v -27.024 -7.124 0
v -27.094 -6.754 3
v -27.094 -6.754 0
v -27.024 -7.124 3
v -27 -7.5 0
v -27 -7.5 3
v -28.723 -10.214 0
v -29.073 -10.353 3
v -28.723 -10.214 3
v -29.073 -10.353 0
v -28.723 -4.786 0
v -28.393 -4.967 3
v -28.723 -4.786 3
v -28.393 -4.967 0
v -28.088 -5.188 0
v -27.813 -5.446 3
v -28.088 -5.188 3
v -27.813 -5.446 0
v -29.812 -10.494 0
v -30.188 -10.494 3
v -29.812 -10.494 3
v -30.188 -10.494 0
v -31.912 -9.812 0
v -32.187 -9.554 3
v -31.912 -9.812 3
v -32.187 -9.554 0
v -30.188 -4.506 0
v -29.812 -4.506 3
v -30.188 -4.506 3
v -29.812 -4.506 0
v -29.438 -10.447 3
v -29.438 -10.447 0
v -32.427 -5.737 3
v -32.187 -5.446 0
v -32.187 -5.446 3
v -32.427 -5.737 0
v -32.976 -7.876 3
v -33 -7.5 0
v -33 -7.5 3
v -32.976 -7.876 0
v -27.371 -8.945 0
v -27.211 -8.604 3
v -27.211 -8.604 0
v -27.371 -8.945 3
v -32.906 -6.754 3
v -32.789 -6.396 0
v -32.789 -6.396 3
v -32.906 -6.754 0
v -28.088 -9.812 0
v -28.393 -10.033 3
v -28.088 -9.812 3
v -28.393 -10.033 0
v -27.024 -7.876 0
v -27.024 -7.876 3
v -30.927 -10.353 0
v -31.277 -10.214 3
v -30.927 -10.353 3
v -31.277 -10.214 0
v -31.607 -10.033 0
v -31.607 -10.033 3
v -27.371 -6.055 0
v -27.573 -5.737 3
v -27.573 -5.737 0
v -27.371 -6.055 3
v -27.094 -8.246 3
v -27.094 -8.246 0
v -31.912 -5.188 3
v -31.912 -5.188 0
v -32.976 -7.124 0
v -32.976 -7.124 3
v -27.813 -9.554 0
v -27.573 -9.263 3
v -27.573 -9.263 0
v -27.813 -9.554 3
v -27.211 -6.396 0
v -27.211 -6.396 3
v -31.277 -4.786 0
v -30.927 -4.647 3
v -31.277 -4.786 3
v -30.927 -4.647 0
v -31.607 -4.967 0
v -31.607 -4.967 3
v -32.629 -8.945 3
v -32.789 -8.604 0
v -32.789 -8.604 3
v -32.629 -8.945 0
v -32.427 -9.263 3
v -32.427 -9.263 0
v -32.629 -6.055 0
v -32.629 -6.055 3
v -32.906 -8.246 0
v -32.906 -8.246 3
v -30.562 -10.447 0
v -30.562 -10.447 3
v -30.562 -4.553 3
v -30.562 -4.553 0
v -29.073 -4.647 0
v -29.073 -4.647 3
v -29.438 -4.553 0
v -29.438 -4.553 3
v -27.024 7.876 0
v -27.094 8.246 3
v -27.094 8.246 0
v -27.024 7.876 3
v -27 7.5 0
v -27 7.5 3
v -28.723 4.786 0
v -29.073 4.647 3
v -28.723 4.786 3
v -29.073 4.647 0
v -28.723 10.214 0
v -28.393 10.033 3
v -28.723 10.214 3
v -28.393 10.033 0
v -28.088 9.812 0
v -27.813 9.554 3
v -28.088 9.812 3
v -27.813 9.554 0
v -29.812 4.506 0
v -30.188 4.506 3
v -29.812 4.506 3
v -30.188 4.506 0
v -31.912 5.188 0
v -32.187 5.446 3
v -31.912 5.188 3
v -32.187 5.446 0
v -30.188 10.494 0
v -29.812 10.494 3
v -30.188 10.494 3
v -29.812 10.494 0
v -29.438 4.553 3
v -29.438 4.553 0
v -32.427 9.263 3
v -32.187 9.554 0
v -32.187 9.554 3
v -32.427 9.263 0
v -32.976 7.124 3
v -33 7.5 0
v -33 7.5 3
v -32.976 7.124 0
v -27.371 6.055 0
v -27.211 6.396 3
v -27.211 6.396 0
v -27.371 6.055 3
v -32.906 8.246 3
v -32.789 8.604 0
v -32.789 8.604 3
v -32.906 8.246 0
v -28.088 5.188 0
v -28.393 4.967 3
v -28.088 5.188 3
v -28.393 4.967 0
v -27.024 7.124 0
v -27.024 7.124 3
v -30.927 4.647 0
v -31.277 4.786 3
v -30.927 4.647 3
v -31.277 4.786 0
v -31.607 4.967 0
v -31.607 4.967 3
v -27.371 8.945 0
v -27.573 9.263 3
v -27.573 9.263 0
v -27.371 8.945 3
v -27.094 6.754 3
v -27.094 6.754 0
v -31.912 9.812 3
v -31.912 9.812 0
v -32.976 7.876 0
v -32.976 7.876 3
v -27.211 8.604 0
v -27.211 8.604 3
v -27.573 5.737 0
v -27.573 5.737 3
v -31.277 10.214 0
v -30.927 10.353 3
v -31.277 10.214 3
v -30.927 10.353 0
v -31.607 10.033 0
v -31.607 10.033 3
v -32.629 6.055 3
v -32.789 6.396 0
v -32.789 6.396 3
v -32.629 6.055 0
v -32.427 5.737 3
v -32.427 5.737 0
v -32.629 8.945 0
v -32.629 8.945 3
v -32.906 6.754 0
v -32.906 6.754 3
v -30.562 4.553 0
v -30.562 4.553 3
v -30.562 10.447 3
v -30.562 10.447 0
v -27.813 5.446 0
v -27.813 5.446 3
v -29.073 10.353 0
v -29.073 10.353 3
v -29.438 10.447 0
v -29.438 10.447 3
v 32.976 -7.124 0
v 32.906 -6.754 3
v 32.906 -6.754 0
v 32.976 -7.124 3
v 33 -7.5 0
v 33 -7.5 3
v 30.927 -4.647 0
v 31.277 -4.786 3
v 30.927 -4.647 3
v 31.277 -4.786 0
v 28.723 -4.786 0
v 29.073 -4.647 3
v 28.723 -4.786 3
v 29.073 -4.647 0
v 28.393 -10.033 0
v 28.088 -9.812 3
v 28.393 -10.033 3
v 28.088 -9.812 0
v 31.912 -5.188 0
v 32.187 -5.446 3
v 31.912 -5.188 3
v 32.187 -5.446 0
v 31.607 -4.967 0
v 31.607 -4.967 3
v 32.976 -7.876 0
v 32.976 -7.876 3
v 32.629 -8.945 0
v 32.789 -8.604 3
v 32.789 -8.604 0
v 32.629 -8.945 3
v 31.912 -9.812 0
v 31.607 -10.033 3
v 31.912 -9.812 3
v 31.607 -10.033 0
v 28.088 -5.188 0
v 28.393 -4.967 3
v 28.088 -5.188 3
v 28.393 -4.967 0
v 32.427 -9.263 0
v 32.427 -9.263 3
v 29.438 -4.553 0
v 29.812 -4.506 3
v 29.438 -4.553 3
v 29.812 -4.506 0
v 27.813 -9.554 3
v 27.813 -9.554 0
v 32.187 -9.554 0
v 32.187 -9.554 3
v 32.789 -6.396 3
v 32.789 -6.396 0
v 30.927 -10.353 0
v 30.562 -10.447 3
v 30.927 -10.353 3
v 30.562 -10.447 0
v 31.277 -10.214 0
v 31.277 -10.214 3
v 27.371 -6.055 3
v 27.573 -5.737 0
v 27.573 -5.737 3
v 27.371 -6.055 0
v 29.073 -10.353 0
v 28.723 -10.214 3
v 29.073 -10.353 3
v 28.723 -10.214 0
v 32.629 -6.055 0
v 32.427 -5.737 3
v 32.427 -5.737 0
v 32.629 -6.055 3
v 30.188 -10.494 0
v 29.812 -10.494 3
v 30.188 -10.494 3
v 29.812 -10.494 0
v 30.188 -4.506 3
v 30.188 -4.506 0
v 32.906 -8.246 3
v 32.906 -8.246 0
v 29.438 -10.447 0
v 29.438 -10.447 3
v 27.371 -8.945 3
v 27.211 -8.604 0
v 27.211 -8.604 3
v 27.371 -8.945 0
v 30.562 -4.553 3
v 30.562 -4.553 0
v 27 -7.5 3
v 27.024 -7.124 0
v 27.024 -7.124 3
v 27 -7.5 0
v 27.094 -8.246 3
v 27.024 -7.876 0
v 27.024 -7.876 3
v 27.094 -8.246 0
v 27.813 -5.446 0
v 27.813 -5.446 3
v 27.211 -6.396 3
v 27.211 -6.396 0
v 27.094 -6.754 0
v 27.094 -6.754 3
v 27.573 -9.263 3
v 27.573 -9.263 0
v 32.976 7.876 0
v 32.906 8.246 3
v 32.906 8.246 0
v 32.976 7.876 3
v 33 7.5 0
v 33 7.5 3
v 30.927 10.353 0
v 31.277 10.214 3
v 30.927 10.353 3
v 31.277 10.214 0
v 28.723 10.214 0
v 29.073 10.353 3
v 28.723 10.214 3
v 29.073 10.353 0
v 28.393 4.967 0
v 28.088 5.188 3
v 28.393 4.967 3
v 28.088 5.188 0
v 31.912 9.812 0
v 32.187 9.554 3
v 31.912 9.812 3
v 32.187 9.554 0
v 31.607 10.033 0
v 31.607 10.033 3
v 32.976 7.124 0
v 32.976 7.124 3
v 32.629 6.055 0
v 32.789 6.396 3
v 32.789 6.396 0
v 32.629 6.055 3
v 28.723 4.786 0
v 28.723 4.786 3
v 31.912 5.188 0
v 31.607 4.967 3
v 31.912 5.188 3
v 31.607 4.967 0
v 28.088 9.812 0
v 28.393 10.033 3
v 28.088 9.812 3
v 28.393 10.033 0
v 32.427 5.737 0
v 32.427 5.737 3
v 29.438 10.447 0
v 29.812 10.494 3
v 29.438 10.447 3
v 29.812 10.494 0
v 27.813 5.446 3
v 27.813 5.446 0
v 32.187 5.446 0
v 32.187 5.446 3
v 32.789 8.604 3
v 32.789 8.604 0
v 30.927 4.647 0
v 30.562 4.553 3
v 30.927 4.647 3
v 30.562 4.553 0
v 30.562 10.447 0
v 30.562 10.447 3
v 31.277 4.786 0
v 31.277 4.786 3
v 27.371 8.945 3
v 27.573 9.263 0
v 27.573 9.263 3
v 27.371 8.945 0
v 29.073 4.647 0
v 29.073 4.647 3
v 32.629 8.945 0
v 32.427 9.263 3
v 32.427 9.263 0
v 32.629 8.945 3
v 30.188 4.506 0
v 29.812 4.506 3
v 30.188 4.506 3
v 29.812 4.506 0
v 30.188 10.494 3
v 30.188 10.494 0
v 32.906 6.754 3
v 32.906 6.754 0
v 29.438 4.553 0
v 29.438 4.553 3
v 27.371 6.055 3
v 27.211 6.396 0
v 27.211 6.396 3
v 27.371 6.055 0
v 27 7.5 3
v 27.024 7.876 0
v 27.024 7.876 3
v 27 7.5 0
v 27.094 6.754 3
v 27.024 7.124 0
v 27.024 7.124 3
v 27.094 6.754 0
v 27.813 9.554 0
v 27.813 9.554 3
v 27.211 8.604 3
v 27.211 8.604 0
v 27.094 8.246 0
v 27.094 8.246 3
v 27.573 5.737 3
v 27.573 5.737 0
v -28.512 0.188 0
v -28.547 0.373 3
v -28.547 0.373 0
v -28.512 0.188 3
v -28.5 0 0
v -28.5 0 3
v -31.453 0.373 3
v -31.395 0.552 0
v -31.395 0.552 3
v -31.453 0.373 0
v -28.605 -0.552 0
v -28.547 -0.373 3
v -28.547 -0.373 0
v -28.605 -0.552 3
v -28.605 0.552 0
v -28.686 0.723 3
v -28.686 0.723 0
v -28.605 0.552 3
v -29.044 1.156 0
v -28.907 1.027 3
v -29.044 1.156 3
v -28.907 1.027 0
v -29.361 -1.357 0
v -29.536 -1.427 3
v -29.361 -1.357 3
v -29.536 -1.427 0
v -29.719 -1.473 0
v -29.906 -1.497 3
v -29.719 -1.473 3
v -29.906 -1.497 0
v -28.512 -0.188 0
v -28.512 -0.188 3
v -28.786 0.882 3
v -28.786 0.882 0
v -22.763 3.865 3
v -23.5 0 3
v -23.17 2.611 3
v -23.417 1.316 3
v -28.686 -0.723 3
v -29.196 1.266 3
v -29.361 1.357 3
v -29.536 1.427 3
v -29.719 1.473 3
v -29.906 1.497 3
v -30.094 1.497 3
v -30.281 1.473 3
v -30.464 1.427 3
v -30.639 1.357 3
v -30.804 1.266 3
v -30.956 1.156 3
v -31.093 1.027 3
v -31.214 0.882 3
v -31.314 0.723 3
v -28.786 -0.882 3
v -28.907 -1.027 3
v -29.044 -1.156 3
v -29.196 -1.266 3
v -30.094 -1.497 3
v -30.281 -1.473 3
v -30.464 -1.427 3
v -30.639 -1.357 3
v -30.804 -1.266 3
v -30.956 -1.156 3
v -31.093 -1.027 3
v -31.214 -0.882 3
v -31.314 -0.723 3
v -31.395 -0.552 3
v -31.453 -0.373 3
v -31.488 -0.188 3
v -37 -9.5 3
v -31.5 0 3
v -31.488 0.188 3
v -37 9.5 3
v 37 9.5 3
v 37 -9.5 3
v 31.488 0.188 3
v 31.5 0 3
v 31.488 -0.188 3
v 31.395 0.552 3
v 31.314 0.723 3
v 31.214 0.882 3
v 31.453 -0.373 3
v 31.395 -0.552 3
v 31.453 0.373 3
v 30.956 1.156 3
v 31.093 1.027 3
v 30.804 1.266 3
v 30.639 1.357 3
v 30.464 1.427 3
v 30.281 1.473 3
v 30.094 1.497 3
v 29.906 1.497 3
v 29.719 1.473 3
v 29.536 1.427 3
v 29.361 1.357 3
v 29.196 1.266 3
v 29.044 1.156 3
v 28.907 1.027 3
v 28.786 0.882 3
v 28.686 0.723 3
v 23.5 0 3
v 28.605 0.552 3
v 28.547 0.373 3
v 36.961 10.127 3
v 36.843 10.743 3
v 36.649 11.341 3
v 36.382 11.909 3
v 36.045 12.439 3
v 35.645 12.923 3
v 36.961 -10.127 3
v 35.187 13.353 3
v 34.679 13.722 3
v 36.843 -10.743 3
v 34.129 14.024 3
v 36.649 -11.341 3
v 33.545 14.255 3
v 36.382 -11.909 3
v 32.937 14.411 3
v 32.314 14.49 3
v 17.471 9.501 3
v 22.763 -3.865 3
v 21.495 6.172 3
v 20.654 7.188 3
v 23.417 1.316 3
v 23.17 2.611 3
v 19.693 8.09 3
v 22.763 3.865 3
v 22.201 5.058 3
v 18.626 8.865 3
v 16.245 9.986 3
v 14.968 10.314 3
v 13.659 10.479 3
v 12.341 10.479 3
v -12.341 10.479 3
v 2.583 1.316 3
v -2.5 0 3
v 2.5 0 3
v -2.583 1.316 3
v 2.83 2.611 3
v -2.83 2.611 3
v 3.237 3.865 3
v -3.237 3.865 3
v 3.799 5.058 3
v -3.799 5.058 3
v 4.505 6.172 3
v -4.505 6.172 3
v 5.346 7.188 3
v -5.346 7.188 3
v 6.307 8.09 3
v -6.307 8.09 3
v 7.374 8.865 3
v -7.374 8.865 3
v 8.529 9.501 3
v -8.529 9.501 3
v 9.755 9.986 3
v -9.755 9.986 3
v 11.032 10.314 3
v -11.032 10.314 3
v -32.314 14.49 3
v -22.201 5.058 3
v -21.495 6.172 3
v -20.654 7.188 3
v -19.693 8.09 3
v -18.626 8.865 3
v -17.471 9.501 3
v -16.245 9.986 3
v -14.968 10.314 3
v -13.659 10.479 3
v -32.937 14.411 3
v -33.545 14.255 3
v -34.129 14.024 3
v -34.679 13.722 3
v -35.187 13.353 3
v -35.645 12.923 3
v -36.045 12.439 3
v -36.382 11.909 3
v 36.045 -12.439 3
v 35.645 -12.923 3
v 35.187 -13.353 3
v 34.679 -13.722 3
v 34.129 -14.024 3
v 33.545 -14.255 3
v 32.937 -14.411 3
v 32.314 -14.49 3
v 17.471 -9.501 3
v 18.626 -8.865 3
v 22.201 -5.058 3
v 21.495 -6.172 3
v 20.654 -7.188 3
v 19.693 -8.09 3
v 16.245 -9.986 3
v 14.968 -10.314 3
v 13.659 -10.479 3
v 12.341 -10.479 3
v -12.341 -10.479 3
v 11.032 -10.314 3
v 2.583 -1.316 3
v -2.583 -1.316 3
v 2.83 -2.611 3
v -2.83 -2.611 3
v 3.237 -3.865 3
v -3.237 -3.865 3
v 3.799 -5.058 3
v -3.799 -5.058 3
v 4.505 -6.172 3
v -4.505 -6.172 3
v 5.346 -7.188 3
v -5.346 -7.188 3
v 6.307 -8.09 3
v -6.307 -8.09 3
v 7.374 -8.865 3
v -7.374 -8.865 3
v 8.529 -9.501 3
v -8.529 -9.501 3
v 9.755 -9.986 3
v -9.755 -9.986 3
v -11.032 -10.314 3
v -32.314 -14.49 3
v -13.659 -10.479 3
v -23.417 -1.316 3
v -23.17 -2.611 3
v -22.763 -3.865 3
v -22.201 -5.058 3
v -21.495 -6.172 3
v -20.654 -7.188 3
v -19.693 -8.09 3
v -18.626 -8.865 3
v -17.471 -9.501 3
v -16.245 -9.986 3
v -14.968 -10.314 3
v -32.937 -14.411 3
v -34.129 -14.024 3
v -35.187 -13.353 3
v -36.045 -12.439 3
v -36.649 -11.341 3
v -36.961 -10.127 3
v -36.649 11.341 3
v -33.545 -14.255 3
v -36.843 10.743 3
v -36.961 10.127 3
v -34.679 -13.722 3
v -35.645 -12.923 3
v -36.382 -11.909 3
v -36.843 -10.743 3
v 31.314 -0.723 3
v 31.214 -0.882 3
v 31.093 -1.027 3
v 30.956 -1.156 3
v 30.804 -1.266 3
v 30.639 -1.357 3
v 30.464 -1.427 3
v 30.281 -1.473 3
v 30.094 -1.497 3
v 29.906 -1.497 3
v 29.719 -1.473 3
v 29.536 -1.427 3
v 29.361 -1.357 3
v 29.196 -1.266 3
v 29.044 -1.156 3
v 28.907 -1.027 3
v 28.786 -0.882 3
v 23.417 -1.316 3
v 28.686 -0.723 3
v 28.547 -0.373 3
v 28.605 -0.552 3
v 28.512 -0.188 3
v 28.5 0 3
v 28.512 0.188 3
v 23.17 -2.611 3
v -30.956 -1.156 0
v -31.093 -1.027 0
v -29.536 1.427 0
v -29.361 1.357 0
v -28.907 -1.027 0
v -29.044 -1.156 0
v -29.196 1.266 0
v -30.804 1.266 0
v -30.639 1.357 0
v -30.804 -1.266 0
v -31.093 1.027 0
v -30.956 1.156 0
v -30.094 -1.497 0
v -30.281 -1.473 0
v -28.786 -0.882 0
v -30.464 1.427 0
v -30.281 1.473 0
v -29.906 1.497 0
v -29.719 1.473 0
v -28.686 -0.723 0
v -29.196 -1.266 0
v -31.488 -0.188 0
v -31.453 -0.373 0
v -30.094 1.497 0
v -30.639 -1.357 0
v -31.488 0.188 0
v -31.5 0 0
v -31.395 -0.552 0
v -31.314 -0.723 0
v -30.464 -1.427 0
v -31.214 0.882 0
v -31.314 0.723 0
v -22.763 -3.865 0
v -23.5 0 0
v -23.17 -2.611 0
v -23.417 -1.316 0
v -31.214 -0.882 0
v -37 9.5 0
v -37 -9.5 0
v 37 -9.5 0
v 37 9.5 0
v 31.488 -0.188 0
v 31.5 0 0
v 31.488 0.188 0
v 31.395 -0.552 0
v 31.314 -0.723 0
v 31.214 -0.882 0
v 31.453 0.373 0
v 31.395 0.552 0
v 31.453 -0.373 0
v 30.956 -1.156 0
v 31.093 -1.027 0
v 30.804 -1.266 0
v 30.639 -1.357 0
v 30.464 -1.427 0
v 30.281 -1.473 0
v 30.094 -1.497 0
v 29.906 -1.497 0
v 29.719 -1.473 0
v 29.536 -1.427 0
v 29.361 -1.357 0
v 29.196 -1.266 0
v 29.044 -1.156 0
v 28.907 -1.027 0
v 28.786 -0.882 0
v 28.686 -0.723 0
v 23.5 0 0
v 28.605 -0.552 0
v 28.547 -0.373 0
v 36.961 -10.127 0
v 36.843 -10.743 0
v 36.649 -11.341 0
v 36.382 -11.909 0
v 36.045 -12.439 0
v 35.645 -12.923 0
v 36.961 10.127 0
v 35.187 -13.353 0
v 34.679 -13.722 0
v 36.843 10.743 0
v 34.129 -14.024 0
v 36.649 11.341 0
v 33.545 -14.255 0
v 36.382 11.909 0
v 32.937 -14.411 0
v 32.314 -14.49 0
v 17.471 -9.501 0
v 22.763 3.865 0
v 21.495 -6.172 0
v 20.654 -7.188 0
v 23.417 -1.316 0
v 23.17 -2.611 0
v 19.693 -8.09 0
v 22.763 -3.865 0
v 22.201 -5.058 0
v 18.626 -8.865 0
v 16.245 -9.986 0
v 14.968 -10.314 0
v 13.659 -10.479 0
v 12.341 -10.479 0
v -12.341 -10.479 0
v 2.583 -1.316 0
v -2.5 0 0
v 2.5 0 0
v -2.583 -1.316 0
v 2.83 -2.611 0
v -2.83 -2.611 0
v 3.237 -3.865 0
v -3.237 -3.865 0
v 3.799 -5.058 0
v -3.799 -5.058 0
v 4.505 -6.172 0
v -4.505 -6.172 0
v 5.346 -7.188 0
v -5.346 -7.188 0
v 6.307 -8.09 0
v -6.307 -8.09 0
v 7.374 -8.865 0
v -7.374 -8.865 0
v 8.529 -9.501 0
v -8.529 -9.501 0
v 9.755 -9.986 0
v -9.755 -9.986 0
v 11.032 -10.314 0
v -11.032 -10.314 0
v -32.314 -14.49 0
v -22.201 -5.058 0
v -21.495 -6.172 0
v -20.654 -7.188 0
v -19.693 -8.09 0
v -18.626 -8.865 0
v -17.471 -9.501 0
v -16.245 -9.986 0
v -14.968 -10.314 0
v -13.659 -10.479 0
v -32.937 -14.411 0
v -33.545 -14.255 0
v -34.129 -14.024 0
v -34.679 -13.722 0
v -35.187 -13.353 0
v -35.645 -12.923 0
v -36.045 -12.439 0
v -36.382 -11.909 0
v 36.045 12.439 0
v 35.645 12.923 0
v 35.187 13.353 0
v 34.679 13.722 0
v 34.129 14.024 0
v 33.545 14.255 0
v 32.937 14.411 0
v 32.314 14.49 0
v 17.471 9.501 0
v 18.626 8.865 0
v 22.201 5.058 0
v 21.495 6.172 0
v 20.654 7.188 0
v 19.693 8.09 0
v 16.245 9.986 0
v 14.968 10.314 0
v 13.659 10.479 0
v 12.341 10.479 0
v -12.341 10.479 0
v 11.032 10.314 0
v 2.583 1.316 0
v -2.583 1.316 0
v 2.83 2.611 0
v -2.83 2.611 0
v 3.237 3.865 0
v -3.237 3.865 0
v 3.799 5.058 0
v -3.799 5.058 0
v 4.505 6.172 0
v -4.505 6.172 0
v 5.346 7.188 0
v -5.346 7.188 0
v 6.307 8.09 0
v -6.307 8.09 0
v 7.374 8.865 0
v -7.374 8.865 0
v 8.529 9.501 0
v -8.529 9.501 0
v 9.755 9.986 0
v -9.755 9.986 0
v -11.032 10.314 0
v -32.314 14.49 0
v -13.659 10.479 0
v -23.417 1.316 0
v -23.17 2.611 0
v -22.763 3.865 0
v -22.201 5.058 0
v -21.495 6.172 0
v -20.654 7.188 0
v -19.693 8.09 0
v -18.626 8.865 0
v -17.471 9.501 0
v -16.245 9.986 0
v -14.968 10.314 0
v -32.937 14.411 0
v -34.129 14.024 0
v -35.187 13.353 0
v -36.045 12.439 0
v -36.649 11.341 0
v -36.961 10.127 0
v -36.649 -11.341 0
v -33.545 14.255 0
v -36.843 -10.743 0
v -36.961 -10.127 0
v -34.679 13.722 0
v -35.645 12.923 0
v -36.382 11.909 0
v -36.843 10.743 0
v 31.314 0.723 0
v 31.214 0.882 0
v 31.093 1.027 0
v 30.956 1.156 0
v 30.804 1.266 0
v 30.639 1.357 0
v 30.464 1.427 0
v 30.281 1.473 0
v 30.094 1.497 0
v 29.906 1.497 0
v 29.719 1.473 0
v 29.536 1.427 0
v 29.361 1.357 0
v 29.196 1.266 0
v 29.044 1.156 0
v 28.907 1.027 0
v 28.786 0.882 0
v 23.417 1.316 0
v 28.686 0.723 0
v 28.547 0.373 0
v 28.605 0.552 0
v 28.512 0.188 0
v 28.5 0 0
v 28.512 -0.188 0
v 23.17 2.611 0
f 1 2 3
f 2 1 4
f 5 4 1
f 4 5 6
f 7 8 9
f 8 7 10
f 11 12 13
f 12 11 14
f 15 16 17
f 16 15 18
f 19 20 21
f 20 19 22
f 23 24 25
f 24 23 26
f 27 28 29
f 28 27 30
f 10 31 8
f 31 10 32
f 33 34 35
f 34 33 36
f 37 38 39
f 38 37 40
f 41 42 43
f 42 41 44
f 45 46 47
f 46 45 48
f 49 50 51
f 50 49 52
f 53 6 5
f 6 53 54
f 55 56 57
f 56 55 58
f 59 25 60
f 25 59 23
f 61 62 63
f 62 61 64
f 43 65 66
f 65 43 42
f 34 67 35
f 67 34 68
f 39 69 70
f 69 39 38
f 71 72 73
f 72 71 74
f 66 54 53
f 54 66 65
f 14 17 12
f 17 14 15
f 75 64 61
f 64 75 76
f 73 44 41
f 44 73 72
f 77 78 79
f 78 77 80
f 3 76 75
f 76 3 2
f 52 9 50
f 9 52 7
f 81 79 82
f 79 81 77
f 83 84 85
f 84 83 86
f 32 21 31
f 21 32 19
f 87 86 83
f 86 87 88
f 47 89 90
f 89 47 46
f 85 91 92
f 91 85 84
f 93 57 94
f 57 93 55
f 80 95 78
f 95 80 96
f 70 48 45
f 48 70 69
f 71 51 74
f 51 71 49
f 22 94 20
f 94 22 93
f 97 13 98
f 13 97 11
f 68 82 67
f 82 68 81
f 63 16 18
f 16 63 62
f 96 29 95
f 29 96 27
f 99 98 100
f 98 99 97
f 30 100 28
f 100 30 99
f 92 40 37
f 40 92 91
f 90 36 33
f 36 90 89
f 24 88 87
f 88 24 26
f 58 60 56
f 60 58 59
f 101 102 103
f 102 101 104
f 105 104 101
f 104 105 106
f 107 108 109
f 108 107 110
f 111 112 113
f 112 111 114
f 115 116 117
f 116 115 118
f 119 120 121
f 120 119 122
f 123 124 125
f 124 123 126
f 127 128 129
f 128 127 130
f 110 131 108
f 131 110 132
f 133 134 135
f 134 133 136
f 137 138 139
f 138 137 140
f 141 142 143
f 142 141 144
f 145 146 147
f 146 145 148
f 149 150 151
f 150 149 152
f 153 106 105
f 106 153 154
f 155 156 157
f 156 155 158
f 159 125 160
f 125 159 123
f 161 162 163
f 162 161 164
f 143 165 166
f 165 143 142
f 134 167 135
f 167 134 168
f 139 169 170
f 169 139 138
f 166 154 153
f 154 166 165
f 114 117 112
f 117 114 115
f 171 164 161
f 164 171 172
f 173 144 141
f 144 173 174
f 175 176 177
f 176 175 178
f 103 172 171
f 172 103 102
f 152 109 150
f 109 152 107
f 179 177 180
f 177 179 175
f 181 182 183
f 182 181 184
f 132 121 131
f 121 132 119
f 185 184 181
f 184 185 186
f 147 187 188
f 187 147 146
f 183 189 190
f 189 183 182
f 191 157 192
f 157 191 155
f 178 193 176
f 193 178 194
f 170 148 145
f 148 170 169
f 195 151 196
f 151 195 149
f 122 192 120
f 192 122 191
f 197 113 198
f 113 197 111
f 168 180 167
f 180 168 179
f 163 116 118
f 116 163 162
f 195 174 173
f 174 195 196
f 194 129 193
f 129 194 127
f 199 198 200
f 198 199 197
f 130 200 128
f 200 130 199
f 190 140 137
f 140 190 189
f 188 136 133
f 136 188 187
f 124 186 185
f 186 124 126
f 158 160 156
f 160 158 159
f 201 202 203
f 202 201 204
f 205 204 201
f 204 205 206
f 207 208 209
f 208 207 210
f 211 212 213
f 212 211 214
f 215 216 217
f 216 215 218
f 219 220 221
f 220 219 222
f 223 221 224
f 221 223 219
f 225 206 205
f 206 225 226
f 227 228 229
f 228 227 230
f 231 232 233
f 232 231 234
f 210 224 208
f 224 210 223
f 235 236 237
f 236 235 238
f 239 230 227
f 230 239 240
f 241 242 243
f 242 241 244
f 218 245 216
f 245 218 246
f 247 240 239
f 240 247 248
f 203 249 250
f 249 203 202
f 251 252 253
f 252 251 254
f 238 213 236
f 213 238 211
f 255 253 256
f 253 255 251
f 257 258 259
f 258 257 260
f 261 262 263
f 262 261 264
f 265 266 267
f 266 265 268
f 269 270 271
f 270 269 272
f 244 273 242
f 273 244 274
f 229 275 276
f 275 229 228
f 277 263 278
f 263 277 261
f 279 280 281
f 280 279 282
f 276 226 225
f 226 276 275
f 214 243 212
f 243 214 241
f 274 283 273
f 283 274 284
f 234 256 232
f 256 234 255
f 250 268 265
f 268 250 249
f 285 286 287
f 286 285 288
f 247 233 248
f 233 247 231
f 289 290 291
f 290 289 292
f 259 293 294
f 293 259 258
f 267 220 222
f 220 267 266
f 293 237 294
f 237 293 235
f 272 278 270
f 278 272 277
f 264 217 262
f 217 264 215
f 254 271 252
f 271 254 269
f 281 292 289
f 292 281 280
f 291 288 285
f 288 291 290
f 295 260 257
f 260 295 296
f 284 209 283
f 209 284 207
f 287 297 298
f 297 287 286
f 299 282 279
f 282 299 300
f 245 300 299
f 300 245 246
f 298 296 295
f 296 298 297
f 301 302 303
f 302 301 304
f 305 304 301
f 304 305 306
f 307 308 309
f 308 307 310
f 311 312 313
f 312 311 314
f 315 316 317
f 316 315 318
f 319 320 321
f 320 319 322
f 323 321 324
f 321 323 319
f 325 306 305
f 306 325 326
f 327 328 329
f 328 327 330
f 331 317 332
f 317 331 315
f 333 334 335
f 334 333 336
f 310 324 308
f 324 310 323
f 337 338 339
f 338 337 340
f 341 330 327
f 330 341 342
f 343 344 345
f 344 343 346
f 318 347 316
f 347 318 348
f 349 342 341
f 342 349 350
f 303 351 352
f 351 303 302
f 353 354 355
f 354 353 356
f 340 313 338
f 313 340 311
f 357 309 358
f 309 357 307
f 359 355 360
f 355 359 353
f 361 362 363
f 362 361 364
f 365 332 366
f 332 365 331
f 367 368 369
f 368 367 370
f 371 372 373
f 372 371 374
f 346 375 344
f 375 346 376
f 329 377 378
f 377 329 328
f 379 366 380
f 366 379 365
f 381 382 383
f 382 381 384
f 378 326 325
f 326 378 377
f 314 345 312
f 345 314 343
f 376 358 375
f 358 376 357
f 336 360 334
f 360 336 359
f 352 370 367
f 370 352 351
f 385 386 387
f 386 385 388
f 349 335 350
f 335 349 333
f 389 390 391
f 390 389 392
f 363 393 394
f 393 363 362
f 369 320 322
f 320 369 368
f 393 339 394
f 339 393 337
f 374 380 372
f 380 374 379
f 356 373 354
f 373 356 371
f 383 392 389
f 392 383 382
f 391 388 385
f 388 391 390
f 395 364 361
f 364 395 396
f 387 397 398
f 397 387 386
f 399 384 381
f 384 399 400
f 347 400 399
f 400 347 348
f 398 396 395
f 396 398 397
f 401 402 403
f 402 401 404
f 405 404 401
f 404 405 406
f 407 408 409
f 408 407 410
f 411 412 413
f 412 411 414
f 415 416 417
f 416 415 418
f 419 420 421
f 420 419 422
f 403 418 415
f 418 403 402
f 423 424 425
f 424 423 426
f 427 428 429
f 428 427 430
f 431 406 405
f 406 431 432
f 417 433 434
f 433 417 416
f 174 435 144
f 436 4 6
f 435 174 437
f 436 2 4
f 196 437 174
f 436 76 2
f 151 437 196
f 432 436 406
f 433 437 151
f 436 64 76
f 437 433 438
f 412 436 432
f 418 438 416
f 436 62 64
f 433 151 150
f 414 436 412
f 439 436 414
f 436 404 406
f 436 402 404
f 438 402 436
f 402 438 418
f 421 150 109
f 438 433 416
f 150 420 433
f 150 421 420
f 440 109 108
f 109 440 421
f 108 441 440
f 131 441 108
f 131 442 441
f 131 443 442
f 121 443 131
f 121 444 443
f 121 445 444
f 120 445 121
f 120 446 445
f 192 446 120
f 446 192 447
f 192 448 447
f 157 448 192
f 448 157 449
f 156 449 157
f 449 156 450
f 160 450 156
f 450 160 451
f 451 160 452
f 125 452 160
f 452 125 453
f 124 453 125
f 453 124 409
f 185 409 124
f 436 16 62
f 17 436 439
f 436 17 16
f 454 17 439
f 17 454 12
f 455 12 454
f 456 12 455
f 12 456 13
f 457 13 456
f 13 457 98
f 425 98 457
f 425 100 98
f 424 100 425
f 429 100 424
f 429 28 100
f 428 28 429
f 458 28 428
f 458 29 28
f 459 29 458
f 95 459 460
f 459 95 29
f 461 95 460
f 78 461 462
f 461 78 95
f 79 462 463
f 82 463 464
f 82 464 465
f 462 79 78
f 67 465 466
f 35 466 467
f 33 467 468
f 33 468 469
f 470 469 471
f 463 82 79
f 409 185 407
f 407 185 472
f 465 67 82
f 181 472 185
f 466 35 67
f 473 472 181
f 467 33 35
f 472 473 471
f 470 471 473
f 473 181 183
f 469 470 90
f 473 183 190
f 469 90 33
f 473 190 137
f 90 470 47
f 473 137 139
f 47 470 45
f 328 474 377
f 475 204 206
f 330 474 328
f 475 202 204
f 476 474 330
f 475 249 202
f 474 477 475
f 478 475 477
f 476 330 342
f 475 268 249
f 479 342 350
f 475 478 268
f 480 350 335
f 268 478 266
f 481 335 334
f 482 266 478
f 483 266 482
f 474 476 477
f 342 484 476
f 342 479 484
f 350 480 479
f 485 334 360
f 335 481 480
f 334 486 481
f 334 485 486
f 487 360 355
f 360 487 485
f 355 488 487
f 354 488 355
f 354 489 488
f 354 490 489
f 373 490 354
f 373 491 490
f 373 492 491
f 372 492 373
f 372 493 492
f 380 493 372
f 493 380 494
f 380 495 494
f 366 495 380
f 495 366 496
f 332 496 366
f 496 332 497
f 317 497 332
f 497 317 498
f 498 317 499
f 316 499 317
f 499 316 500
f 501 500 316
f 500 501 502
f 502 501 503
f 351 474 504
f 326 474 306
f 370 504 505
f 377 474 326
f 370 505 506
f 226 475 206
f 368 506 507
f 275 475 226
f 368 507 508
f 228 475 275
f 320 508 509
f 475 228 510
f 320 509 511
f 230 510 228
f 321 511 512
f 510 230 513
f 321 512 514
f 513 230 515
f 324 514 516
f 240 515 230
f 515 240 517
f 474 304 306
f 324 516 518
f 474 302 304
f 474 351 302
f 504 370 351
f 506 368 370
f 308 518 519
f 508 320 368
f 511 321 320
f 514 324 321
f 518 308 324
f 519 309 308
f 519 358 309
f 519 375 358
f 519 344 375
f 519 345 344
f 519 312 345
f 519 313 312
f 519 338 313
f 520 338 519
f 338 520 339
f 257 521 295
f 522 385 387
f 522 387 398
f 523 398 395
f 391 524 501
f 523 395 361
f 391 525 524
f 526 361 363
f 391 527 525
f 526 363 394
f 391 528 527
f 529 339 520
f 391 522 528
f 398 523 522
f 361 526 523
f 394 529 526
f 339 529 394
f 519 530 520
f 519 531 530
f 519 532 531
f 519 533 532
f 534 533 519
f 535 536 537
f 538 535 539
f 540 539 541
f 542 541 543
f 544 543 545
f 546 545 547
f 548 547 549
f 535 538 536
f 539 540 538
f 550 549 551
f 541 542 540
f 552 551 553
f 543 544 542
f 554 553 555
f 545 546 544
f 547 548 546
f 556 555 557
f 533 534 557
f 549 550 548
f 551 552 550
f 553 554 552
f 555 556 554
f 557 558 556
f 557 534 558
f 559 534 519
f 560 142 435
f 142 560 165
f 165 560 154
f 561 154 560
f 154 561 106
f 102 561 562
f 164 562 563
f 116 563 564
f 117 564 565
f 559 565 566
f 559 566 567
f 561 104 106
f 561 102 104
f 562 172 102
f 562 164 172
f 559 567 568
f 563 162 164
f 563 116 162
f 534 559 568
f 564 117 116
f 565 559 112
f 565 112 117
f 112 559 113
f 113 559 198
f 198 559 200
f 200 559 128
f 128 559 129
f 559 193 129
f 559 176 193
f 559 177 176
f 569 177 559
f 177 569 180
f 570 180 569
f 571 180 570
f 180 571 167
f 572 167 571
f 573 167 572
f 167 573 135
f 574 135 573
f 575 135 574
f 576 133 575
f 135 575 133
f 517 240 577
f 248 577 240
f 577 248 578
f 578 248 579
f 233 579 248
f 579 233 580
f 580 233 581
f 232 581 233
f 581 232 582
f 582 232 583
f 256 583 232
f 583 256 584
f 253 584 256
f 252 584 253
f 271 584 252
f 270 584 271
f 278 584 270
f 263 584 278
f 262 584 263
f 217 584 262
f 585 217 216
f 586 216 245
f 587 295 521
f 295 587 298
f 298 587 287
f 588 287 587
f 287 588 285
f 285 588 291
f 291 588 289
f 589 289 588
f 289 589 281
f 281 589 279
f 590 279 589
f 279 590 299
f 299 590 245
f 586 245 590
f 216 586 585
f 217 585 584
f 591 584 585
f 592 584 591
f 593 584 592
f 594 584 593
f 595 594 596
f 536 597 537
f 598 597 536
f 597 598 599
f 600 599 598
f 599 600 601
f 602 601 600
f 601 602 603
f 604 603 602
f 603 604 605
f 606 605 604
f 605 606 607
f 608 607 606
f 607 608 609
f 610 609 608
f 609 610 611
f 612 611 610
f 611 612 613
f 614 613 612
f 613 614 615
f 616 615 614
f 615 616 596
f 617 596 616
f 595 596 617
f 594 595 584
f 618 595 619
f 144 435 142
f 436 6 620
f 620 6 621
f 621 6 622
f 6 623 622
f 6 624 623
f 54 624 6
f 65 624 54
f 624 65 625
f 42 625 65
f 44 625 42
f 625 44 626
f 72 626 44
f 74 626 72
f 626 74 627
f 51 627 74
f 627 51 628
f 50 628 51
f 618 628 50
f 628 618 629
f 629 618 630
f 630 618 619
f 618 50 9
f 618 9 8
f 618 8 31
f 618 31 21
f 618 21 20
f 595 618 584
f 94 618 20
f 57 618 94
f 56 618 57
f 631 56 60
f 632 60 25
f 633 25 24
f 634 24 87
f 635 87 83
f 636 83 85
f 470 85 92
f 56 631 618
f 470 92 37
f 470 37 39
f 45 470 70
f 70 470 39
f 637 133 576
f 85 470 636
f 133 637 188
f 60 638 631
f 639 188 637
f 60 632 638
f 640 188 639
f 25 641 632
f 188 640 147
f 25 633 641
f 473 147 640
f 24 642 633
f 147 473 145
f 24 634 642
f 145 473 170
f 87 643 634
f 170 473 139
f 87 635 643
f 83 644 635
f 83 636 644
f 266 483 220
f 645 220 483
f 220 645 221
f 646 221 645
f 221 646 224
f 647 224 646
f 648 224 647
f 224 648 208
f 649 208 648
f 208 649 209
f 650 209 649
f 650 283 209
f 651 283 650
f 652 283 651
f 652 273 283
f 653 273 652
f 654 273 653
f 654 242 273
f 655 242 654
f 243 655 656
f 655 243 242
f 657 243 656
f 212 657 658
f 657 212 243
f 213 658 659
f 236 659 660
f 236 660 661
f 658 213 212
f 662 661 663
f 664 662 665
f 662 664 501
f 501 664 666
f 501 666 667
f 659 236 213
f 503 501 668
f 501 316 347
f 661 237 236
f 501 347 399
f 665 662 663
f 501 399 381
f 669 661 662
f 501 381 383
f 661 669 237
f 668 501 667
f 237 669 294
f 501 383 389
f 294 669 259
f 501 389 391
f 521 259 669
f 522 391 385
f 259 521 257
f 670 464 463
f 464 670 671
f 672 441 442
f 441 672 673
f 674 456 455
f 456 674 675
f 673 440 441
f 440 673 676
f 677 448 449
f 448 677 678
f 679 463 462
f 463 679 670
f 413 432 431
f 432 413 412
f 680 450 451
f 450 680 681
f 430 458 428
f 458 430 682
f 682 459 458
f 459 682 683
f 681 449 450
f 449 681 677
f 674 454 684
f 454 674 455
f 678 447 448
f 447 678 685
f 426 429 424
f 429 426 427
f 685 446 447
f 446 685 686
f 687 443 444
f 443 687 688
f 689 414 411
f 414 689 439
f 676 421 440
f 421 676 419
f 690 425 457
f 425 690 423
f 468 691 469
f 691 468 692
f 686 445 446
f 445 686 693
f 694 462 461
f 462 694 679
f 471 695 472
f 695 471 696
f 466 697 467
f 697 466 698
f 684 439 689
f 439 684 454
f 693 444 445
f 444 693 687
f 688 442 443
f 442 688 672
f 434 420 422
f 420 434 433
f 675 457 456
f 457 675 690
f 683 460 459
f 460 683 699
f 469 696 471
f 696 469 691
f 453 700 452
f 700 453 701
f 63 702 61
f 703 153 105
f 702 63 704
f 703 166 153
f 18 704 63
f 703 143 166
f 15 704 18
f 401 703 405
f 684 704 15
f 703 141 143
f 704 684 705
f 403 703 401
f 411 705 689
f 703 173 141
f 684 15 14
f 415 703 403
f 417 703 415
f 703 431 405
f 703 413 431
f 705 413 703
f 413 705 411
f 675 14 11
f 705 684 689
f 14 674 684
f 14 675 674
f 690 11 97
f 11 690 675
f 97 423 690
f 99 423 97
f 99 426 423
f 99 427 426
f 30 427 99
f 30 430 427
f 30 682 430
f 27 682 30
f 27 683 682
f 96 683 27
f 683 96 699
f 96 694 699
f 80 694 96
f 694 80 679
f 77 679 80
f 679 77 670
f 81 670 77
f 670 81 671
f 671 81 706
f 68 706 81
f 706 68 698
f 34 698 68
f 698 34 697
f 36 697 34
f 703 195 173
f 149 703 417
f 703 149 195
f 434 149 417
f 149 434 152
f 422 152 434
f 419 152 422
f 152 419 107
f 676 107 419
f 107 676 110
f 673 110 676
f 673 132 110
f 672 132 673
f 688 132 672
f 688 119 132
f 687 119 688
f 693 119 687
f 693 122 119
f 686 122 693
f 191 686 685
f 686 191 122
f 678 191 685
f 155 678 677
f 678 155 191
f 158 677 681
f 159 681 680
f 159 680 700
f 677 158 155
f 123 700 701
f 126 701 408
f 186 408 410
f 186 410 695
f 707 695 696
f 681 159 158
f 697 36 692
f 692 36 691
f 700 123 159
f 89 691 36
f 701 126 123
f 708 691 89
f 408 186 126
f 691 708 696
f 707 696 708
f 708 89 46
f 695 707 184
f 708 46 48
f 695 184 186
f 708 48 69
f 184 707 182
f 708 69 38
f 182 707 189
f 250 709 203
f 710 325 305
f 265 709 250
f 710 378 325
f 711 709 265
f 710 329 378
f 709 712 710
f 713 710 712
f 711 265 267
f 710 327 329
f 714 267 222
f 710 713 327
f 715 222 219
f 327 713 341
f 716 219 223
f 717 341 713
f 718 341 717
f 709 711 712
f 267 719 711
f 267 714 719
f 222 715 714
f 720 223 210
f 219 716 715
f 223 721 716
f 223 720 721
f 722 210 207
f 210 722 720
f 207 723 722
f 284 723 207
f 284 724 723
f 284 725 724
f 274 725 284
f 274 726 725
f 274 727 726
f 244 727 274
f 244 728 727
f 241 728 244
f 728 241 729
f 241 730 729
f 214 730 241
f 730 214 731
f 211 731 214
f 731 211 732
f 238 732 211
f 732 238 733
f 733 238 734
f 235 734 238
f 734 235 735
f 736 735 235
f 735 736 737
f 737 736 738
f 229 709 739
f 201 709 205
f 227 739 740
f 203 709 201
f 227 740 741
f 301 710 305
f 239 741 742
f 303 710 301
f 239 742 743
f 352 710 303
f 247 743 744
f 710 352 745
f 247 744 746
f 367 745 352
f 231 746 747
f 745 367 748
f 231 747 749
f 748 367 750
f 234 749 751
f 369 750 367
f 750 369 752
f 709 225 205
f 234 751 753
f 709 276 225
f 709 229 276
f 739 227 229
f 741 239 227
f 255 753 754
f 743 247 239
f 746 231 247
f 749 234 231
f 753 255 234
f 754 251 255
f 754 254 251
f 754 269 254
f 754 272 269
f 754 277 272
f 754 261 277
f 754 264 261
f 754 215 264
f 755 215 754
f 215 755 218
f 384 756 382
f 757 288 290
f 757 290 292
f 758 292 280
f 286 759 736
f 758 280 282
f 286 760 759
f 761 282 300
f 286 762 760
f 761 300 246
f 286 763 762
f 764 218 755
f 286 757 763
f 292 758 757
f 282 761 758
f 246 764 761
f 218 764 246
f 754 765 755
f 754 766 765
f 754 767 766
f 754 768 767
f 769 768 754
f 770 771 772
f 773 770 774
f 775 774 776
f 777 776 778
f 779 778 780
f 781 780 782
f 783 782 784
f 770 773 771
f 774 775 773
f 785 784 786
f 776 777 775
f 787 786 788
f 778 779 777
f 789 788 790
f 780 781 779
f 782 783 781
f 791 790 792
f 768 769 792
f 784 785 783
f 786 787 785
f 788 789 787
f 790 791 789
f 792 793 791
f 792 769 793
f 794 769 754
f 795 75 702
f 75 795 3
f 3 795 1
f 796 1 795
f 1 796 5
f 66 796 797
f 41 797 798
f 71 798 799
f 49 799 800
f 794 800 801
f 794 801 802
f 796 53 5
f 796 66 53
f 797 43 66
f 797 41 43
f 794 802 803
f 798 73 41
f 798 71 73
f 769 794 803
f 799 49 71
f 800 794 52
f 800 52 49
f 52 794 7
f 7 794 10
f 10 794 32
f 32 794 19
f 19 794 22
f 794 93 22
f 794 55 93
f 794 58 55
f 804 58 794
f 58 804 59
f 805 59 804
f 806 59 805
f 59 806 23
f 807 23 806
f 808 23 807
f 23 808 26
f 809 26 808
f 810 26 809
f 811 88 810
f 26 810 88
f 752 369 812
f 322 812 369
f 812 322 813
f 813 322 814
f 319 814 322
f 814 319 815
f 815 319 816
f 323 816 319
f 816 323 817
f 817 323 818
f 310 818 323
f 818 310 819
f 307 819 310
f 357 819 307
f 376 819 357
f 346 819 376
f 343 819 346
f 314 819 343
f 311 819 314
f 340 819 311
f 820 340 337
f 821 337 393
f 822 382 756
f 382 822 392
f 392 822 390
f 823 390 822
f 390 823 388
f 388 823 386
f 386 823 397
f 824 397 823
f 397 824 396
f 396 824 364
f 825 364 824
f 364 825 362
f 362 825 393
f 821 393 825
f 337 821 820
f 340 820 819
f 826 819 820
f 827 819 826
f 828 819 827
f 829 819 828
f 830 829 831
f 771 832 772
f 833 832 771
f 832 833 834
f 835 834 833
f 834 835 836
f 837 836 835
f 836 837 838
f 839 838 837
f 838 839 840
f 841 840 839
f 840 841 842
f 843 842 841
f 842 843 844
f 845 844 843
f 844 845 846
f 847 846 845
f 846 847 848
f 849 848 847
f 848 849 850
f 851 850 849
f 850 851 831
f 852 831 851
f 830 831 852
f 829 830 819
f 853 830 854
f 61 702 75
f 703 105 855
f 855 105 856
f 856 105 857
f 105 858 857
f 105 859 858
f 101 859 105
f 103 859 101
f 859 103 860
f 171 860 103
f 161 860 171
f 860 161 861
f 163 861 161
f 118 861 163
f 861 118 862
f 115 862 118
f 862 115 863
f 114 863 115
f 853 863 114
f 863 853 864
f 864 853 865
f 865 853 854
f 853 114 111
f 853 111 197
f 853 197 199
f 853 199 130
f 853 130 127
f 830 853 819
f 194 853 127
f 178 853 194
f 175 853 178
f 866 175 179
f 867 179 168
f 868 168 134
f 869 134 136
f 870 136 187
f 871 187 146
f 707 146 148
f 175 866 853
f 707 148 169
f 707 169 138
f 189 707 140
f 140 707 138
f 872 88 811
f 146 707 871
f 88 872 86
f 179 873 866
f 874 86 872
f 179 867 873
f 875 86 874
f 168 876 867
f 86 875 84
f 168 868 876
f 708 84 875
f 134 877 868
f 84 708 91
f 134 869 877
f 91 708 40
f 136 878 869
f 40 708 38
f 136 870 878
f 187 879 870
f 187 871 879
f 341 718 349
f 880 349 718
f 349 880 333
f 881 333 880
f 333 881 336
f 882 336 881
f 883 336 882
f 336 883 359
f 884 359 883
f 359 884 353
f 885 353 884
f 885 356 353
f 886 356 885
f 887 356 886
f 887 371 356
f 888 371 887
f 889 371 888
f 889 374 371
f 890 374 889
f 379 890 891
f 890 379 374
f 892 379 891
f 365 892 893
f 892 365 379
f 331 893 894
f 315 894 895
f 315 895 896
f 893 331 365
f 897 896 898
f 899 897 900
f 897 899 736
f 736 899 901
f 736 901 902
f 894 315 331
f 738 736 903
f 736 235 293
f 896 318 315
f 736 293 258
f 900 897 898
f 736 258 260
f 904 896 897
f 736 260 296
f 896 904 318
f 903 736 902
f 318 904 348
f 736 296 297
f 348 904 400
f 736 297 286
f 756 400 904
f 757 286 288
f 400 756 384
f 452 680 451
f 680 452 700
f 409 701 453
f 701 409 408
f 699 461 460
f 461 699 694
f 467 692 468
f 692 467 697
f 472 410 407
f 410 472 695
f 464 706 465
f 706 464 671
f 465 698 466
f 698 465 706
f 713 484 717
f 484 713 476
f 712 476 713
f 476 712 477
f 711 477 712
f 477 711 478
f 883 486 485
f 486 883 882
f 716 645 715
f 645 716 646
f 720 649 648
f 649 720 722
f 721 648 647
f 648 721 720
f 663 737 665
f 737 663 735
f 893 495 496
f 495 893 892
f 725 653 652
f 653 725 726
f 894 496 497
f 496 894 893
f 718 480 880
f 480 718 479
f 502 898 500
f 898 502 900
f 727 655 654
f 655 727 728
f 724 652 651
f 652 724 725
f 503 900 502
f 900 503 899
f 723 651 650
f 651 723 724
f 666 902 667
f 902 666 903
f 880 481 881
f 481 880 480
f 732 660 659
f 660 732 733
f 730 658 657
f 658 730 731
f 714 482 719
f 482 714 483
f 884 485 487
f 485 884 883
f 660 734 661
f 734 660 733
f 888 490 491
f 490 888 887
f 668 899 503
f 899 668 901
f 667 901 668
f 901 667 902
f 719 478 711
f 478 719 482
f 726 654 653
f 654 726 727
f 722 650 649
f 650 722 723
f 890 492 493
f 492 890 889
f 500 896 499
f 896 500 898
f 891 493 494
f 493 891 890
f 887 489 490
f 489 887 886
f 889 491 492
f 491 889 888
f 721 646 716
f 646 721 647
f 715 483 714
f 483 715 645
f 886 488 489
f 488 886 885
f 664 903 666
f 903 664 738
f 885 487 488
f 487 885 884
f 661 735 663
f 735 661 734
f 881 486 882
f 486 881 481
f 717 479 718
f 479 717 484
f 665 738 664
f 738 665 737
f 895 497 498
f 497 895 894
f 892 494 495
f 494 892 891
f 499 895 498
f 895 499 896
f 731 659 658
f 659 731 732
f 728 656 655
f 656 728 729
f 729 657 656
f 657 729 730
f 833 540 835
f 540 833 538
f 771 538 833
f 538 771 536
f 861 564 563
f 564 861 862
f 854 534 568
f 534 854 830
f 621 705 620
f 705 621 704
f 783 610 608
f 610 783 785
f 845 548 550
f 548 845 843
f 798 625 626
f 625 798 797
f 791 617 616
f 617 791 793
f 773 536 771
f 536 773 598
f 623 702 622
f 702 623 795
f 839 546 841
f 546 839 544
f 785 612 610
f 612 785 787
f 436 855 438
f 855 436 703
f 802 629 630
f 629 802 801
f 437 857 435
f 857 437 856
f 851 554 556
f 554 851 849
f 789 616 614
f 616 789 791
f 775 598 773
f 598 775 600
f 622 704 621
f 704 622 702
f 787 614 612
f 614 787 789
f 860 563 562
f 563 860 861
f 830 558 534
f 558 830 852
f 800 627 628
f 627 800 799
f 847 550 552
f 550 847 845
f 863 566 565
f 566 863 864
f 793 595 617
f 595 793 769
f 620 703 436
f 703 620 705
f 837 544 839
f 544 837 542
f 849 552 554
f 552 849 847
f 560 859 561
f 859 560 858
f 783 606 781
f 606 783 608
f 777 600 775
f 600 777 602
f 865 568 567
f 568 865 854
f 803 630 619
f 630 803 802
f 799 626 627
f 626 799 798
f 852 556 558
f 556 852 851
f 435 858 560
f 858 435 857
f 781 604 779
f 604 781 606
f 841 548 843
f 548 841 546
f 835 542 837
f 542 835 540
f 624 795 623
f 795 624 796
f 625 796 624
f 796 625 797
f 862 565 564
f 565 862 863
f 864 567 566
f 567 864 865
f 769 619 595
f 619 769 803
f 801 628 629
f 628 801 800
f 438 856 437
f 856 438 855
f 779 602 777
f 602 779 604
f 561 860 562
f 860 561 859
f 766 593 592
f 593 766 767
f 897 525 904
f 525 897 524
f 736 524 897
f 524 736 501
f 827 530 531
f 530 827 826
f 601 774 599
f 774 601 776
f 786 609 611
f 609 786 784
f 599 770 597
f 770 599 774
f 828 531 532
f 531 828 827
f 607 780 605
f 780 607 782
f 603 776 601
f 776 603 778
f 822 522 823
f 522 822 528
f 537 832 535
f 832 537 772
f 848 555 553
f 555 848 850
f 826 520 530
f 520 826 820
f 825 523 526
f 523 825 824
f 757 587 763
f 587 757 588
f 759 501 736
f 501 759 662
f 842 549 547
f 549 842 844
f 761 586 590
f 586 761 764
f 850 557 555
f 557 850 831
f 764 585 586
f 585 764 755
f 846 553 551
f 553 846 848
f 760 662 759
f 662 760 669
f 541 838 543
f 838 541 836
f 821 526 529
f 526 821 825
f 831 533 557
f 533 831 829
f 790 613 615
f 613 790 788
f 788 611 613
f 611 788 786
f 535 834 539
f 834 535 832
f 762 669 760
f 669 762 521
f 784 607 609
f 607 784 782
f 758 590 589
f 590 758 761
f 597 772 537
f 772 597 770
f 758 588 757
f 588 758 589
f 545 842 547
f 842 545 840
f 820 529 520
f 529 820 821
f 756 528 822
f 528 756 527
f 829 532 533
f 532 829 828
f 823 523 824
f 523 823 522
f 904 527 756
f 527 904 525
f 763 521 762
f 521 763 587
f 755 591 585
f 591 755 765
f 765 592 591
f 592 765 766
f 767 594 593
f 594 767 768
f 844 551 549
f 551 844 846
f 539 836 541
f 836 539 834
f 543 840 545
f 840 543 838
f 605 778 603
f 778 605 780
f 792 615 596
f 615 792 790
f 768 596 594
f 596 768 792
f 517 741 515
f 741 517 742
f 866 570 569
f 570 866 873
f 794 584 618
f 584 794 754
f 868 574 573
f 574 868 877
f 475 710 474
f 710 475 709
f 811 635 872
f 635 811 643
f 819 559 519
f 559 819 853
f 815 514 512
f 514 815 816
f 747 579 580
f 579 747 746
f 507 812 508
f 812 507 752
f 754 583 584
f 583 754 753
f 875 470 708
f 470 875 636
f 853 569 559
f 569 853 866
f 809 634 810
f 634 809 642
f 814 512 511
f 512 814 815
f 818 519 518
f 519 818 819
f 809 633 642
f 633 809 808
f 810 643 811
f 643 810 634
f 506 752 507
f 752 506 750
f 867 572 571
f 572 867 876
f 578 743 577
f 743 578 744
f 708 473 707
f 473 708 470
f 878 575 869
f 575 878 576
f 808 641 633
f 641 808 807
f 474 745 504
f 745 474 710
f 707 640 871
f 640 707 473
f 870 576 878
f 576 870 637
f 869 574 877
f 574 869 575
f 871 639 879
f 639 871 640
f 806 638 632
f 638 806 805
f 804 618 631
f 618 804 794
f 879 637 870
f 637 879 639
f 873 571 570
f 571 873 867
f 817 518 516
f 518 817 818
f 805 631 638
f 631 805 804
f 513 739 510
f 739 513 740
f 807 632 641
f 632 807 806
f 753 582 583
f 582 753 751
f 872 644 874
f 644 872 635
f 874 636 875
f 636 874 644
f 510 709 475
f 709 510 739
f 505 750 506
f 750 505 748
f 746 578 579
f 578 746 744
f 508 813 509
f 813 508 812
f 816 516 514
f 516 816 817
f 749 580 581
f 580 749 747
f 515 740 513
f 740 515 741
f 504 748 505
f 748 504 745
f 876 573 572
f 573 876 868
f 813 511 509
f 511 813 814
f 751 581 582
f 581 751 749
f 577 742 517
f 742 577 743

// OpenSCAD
$fn = 50;


difference() {
	union() {
		hull() {
			translate(v = [-32.0000000000, 9.5000000000, 0]) {
				cylinder(h = 3, r = 5);
			}
			translate(v = [32.0000000000, 9.5000000000, 0]) {
				cylinder(h = 3, r = 5);
			}
			translate(v = [-32.0000000000, -9.5000000000, 0]) {
				cylinder(h = 3, r = 5);
			}
			translate(v = [32.0000000000, -9.5000000000, 0]) {
				cylinder(h = 3, r = 5);
			}
		}
	}
	union() {
		#translate(v = [-30.0000000000, -7.5000000000, 0]) {
			cylinder(h = 3, r = 3.0000000000);
		}
		#translate(v = [-30.0000000000, 7.5000000000, 0]) {
			cylinder(h = 3, r = 3.0000000000);
		}
		#translate(v = [30.0000000000, -7.5000000000, 0]) {
			cylinder(h = 3, r = 3.0000000000);
		}
		#translate(v = [30.0000000000, 7.5000000000, 0]) {
			cylinder(h = 3, r = 3.0000000000);
		}
		#translate(v = [-30.0000000000, -7.5000000000, -100.0000000000]) {
			cylinder(h = 200, r = 3.0000000000);
		}
		#translate(v = [-30.0000000000, 7.5000000000, -100.0000000000]) {
			cylinder(h = 200, r = 3.0000000000);
		}
		#translate(v = [30.0000000000, -7.5000000000, -100.0000000000]) {
			cylinder(h = 200, r = 3.0000000000);
		}
		#translate(v = [30.0000000000, 7.5000000000, -100.0000000000]) {
			cylinder(h = 200, r = 3.0000000000);
		}
		#translate(v = [-30.0000000000, -7.5000000000, 0]) {
			cylinder(h = 3, r = 1.5000000000);
		}
		#translate(v = [-30.0000000000, 0.0000000000, 0]) {
			cylinder(h = 3, r = 1.5000000000);
		}
		#translate(v = [-30.0000000000, 7.5000000000, 0]) {
			cylinder(h = 3, r = 1.5000000000);
		}
		#translate(v = [30.0000000000, -7.5000000000, 0]) {
			cylinder(h = 3, r = 1.5000000000);
		}
		#translate(v = [30.0000000000, 0.0000000000, 0]) {
			cylinder(h = 3, r = 1.5000000000);
		}
		#translate(v = [30.0000000000, 7.5000000000, 0]) {
			cylinder(h = 3, r = 1.5000000000);
		}
		#translate(v = [-30.0000000000, -7.5000000000, 0]) {
			cylinder(h = 3, r = 1.5000000000);
		}
		#translate(v = [-30.0000000000, 0.0000000000, 0]) {
			cylinder(h = 3, r = 1.5000000000);
		}
		#translate(v = [-30.0000000000, 7.5000000000, 0]) {
			cylinder(h = 3, r = 1.5000000000);
		}
		#translate(v = [30.0000000000, -7.5000000000, 0]) {
			cylinder(h = 3, r = 1.5000000000);
		}
		#translate(v = [30.0000000000, 0.0000000000, 0]) {
			cylinder(h = 3, r = 1.5000000000);
		}
		#translate(v = [30.0000000000, 7.5000000000, 0]) {
			cylinder(h = 3, r = 1.5000000000);
		}
		#translate(v = [-30.0000000000, -7.5000000000, 0]) {
			cylinder(h = 3, r = 1.5000000000);
		}
		#translate(v = [-30.0000000000, 0.0000000000, 0]) {
			cylinder(h = 3, r = 1.5000000000);
		}
		#translate(v = [-30.0000000000, 7.5000000000, 0]) {
			cylinder(h = 3, r = 1.5000000000);
		}
		#translate(v = [30.0000000000, -7.5000000000, 0]) {
			cylinder(h = 3, r = 1.5000000000);
		}
		#translate(v = [30.0000000000, 0.0000000000, 0]) {
			cylinder(h = 3, r = 1.5000000000);
		}
		#translate(v = [30.0000000000, 7.5000000000, 0]) {
			cylinder(h = 3, r = 1.5000000000);
		}
		#translate(v = [-13.0000000000, 0, 0]) {
			cylinder(h = 3, r = 10.5000000000);
		}
		#translate(v = [13.0000000000, 0, 0]) {
			cylinder(h = 3, r = 10.5000000000);
		}
	}
}
